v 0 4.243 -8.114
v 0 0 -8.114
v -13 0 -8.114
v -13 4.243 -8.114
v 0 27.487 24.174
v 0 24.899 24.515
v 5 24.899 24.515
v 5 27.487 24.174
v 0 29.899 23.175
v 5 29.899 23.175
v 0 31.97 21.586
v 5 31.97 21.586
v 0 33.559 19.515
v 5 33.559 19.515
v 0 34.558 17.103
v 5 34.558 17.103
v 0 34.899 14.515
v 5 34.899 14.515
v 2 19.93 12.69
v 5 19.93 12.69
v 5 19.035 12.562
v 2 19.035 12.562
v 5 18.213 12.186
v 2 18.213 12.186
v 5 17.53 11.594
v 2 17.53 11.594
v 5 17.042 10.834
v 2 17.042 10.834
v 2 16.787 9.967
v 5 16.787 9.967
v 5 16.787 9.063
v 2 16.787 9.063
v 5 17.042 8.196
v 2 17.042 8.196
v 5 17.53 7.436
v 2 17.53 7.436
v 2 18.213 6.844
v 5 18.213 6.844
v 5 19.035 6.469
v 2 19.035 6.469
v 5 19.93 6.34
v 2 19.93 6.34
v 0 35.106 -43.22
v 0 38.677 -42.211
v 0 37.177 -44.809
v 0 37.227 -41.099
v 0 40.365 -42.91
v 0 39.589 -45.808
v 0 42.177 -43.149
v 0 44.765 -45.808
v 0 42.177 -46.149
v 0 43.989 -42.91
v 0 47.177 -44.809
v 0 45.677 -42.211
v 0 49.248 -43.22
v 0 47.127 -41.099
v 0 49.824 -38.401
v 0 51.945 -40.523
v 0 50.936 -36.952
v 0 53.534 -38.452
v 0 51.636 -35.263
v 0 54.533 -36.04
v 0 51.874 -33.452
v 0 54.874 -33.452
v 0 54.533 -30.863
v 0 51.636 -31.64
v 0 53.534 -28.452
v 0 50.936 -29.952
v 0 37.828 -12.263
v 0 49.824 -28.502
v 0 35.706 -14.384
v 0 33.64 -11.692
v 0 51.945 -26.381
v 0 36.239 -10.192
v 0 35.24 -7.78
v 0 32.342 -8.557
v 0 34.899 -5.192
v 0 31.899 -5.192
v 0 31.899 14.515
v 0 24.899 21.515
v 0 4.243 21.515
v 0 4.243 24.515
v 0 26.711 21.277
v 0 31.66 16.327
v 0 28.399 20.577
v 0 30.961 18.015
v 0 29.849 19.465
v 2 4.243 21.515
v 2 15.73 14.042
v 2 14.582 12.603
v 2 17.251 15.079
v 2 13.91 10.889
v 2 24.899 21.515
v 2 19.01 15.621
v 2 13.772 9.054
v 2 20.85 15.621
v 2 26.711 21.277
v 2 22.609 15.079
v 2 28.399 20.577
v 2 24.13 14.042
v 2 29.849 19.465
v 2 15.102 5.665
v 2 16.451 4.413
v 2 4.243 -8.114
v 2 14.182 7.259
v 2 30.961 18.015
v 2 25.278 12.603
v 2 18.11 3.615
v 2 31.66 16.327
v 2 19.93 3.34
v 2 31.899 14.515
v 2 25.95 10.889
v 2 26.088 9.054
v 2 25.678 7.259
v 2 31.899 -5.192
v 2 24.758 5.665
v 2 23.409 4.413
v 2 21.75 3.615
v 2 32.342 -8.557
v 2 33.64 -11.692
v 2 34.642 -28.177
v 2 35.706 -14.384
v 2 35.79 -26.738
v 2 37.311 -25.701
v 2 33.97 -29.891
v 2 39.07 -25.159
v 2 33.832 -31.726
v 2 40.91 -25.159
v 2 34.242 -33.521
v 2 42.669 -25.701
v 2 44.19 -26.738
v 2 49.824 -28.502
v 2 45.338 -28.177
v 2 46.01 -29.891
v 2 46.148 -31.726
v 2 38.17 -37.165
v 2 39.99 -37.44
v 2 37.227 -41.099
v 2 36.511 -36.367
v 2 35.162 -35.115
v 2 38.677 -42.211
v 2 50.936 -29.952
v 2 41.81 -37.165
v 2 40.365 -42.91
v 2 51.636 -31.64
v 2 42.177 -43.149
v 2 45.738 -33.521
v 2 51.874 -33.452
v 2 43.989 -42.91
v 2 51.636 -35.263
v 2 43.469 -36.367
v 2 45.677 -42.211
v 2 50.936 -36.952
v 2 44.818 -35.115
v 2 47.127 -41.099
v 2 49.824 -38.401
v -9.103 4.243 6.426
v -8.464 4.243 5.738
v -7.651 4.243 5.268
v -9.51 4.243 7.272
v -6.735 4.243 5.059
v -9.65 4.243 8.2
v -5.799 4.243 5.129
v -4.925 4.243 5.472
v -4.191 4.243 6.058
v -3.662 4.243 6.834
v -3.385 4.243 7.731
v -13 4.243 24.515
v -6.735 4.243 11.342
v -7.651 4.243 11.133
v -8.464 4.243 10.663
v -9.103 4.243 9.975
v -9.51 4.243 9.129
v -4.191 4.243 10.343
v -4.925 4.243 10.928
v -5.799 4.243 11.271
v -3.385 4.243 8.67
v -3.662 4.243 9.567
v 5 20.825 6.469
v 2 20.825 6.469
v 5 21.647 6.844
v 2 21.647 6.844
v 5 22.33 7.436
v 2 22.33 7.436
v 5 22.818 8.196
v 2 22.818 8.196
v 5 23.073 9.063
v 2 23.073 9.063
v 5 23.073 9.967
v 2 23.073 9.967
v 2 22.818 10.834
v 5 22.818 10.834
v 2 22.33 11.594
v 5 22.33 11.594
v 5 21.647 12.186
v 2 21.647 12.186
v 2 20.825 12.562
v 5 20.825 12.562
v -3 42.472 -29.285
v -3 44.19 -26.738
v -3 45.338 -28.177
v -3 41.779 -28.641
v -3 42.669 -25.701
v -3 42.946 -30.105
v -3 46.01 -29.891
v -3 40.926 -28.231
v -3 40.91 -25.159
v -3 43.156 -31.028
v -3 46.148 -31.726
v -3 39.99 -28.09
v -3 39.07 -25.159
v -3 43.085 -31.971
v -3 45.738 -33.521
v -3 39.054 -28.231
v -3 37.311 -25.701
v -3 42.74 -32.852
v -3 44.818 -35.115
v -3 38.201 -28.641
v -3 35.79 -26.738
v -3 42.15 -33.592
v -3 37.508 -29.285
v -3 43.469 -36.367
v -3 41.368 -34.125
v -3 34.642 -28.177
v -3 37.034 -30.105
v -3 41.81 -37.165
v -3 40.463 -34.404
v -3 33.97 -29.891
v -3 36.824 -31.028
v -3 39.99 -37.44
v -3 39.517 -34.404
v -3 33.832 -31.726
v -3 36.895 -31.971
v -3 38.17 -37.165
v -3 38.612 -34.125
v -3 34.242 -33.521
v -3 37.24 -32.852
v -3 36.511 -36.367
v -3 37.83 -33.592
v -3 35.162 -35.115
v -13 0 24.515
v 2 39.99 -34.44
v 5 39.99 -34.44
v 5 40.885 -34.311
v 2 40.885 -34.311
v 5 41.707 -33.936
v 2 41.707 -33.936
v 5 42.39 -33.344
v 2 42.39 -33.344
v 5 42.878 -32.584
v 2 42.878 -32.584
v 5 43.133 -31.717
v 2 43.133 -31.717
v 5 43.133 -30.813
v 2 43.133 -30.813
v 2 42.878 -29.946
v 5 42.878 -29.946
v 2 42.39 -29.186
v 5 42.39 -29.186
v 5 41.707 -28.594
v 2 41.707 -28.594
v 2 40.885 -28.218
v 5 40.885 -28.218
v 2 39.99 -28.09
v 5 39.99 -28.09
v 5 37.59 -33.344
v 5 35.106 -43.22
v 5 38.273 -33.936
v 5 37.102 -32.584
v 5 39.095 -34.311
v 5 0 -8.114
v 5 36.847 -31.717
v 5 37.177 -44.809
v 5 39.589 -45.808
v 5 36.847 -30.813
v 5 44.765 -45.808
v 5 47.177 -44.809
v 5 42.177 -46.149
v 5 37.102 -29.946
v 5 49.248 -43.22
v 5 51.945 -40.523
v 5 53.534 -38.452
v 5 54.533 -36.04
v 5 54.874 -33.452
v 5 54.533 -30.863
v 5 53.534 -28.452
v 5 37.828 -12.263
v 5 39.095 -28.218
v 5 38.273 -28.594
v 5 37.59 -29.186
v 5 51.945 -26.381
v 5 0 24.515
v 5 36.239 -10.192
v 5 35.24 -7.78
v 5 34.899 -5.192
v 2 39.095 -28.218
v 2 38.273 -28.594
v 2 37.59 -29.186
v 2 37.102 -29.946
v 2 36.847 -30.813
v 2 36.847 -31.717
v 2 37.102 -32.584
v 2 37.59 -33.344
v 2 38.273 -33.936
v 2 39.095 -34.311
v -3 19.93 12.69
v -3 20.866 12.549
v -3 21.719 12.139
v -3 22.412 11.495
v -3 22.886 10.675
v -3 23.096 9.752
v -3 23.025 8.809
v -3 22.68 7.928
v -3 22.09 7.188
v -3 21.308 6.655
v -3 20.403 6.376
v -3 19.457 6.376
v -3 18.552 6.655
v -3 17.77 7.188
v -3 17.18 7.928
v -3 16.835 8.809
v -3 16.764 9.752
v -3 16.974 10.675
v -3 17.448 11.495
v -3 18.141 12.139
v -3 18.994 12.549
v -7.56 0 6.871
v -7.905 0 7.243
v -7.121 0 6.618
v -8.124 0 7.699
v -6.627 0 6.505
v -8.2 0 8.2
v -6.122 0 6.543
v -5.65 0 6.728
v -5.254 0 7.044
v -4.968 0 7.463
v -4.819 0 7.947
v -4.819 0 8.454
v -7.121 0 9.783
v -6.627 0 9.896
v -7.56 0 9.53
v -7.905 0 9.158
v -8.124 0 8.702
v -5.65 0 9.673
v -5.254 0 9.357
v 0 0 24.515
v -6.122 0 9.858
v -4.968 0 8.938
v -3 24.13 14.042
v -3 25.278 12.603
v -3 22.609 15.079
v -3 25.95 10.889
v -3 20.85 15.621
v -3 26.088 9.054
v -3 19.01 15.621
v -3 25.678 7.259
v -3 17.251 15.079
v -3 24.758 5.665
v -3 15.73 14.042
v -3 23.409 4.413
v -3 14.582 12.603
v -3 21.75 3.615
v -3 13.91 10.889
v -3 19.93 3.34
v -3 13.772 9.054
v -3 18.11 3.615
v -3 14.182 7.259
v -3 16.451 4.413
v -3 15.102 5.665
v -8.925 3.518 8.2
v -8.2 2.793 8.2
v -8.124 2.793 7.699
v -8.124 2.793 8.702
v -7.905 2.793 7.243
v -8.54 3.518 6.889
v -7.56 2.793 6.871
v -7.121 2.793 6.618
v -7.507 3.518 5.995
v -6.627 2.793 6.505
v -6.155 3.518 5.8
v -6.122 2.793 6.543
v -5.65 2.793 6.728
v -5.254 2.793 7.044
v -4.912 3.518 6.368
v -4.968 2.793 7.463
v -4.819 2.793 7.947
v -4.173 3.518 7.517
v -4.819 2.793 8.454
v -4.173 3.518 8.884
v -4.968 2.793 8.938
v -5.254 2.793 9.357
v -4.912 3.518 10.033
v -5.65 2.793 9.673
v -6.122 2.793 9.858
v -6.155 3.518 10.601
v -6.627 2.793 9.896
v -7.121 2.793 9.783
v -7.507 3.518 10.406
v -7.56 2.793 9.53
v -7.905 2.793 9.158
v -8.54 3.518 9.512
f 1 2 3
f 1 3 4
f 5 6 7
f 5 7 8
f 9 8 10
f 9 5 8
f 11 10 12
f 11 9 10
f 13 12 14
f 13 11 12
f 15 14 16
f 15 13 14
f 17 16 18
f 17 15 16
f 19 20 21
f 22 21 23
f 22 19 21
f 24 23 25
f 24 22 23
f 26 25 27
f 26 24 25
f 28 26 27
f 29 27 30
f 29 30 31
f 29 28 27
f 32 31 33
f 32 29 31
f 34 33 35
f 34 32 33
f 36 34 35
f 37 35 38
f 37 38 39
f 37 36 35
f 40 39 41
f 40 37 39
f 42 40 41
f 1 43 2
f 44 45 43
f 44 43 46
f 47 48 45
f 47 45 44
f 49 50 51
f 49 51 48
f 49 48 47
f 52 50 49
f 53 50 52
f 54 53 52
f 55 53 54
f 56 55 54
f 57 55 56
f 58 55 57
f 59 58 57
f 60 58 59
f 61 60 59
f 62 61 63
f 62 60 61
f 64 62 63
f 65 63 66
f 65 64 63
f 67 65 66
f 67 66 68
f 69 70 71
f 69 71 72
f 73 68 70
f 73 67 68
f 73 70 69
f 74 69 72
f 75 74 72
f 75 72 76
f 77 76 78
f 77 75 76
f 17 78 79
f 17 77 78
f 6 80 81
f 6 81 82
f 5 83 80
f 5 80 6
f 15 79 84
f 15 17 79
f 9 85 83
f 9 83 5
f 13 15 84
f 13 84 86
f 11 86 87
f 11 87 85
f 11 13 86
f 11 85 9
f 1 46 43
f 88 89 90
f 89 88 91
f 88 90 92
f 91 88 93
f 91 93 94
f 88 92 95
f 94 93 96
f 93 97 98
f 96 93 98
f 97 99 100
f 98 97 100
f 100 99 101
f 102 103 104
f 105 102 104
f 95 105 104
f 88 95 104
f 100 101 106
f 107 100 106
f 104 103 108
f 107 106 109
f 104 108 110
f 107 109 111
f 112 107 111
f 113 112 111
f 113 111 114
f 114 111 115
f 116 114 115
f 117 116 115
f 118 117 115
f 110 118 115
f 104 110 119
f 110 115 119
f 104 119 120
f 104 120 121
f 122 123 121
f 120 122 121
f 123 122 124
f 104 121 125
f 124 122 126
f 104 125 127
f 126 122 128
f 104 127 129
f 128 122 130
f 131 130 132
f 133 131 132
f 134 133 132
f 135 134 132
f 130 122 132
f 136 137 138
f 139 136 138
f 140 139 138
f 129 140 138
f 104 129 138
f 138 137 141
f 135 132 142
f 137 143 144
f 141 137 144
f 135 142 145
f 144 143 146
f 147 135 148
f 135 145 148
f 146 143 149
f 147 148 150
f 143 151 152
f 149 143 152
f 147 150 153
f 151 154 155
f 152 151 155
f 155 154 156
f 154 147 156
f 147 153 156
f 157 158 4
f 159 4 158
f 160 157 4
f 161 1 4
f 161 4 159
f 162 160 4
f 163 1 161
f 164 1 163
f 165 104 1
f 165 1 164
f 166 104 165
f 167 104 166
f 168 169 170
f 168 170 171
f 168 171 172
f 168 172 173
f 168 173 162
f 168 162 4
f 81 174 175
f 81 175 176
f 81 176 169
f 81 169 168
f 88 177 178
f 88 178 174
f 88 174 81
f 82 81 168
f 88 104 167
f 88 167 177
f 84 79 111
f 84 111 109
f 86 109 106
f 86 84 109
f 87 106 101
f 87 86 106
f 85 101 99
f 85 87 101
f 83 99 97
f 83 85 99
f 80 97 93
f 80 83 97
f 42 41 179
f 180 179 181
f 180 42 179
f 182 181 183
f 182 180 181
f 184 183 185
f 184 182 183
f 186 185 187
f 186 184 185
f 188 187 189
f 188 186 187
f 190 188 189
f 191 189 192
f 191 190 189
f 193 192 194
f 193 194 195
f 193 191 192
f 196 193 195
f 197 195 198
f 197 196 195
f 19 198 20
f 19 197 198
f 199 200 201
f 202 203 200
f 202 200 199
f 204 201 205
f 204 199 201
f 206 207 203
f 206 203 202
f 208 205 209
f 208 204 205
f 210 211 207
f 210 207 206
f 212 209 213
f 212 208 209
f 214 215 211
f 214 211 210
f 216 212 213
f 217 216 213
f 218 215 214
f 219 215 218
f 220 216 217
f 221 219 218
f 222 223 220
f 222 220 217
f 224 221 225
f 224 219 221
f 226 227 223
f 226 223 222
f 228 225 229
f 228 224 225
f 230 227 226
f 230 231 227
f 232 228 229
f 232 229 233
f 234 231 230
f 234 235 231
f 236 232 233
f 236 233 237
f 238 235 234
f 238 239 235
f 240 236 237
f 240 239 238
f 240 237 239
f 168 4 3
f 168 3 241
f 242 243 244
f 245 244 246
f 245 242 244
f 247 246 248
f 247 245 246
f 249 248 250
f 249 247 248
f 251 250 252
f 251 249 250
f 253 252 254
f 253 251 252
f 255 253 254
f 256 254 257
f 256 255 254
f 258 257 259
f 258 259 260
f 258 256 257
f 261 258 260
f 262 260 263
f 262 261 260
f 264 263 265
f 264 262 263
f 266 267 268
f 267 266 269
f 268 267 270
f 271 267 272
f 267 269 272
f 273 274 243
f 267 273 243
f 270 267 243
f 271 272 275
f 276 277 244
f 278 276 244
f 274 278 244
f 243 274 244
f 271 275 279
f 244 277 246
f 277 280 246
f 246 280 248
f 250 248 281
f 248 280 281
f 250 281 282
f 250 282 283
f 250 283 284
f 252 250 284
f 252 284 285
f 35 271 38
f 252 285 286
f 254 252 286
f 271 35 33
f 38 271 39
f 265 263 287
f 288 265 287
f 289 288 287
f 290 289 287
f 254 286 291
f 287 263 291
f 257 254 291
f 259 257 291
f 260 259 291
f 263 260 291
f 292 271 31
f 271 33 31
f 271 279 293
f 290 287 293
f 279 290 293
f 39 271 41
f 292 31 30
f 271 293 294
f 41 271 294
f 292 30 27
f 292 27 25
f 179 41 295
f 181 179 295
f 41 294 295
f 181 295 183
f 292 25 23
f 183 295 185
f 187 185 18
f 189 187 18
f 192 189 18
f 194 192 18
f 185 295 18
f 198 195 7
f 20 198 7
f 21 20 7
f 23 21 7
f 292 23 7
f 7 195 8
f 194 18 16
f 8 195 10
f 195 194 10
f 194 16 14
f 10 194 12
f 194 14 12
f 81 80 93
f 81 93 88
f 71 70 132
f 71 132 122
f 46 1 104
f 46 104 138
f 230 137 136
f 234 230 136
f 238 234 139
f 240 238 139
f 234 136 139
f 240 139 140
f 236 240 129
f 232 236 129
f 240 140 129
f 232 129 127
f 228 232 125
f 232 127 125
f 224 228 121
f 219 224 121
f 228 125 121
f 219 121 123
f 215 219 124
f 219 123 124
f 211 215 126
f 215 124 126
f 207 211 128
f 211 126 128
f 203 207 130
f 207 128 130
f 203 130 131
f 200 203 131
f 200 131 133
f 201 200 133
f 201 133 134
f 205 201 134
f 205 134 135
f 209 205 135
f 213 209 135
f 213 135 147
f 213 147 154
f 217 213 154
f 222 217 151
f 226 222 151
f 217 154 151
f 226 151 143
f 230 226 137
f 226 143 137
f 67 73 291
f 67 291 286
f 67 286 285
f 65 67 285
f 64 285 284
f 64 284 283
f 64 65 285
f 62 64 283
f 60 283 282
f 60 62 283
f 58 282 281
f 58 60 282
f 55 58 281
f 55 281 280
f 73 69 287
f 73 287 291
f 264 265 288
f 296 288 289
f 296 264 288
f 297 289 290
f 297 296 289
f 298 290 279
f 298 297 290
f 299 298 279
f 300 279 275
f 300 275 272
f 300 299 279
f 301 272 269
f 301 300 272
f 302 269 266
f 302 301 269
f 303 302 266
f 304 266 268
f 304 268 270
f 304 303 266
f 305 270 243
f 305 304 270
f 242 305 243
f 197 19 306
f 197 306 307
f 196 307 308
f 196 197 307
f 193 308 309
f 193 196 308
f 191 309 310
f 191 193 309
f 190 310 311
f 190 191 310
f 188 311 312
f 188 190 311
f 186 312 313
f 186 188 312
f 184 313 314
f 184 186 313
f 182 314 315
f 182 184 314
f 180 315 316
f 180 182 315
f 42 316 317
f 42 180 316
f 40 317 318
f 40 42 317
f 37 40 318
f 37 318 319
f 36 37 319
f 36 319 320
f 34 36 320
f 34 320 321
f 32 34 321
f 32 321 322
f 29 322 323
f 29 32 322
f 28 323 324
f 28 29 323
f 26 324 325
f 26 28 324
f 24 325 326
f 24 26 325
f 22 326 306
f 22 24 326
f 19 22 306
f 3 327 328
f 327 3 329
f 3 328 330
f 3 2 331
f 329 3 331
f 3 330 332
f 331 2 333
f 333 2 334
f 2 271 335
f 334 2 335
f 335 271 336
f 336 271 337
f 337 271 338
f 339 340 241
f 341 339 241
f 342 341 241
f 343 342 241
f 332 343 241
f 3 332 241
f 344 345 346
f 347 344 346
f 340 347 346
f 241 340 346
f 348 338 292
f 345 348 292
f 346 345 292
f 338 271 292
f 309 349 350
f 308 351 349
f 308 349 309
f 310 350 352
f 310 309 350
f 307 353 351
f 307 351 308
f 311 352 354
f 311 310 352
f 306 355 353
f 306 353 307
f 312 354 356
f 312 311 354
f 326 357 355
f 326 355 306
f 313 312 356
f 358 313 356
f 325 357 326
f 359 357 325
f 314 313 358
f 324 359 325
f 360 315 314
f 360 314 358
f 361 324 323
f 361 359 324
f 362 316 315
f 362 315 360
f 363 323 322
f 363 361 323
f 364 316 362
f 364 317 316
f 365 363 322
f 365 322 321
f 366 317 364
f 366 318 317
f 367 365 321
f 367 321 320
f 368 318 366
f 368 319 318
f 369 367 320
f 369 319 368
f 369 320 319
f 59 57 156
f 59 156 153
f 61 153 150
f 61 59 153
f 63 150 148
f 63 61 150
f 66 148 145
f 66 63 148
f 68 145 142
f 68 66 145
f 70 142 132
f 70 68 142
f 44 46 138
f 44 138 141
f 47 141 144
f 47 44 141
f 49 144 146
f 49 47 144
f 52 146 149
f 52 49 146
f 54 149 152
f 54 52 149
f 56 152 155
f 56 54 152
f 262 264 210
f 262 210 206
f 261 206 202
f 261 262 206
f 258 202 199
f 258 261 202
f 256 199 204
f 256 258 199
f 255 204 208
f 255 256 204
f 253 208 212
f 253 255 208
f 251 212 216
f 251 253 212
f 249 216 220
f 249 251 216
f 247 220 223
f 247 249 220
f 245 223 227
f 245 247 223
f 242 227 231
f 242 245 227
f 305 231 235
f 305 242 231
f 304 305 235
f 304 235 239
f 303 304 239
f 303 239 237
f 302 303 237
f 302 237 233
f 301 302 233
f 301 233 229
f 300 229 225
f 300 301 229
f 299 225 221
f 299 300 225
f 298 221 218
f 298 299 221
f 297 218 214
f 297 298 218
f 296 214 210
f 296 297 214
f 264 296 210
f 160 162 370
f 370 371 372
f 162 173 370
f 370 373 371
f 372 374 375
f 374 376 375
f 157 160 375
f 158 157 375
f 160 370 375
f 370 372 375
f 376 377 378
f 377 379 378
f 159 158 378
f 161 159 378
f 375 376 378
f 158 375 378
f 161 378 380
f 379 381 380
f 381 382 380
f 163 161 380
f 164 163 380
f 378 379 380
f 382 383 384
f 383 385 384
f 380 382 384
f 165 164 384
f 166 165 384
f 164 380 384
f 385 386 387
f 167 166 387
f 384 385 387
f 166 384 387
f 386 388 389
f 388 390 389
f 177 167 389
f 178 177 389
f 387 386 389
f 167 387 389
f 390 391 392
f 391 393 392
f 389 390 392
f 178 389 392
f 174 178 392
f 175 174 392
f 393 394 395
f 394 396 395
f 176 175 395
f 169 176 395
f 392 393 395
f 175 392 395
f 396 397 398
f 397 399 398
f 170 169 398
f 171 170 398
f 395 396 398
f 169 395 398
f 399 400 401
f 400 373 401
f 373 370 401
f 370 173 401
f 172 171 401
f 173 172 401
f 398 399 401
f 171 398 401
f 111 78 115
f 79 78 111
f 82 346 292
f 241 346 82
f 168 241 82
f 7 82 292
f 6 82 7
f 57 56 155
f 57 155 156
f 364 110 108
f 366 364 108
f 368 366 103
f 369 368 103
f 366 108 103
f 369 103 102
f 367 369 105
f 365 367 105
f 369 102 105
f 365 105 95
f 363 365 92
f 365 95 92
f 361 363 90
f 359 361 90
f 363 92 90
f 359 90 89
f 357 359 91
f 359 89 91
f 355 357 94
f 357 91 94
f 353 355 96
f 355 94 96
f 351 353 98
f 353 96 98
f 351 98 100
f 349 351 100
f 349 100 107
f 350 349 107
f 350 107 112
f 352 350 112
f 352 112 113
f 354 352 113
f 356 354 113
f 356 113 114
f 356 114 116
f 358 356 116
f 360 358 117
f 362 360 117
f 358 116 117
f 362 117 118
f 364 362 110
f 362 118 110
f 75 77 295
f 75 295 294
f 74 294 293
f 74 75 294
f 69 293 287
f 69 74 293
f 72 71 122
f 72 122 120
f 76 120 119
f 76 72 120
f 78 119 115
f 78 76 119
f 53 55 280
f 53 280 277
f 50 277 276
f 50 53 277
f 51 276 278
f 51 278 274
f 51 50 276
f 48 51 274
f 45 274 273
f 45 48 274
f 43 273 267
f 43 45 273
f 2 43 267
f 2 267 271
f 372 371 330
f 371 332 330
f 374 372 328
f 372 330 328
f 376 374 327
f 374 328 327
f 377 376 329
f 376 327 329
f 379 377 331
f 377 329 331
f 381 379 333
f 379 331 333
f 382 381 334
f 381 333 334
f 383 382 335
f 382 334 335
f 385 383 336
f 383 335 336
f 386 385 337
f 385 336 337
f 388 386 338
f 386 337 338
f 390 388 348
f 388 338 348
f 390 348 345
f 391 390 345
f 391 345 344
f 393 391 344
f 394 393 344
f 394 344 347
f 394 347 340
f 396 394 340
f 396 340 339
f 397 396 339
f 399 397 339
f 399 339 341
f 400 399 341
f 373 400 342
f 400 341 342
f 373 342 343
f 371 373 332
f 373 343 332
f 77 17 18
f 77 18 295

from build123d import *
from build123d.topology import SkipClean

# Parameters (mm, degrees)
SKETCH1_R                                       = 3.175
EXTRUDE_BODY_DEPTH                              = 5
INSET_BODY_DEPTH                                = 2
SKETCH3_R                                       = 6.175
CUT_HOLE_BOSS_DEPTH                             = 5
CUT_EXTRUDE2_DEPTH                              = 72.874270106
CUT_EXTRUDE2_DEPTH_BACK                         = 5
REAM_HOLE_R                                     = 3.175
SKETCH4_W                                       = 32.629490944
SKETCH4_H                                       = 4.242640687
BOSS_EXTRUDE1_DEPTH                             = 15
CSK_FOR_M3_FLAT_HEAD_MACHINE_SCREW1_D           = 3.4
CSK_FOR_M3_FLAT_HEAD_MACHINE_SCREW1_CSINK_D     = 6.3
CSK_FOR_M3_FLAT_HEAD_MACHINE_SCREW1_CSINK_ANGLE = 90


with BuildPart() as part:
    # Sketch1 → Extrude body (new body)
    with BuildSketch(Plane(origin=(0, 0, 0), x_dir=(0, 0, -1), z_dir=(1, 0, 0))):
        with BuildLine():
            Line((8.114294626, 0), (-24.515196318, 0))
            Line((-24.515196318, 0), (-24.515196318, 24.898772612))
            ThreePointArc((-24.515196318, 24.898772612), (-21.586264129, 31.969840424), (-14.515196318, 34.898772612))
            Line((-14.515196318, 34.898772612), (5.191949728, 34.898772612))
            ThreePointArc((5.191949728, 34.898772612), (9.018784051, 35.659977287), (12.26301754, 37.8277048))
            Line((12.26301754, 37.8277048), (26.380592117, 51.945279378))
            ThreePointArc((26.380592117, 51.945279378), (33.451659929, 54.874211566), (40.52272774, 51.945279378))
            Line((40.52272774, 51.945279378), (43.22008306, 49.247924058))
            ThreePointArc((43.22008306, 49.247924058), (46.149015248, 42.176856246), (43.22008306, 35.105788434))
            Line((43.22008306, 35.105788434), (8.114294626, 0))
        make_face()
        with Locations((31.264803682, 39.99)):
            Circle(SKETCH1_R, mode=Mode.SUBTRACT)
        with Locations((-9.515196318, 19.93)):
            Circle(SKETCH1_R, mode=Mode.SUBTRACT)
    extrude(amount=EXTRUDE_BODY_DEPTH)

    # Sketch2 → Inset body (cut)
    with BuildSketch(Plane(origin=(0, 0, 0), x_dir=(0, 0, -1), z_dir=(1, 0, 0))):
        with BuildLine():
            Line((-21.515196318, 24.898772612), (-21.515196318, 3))
            Line((-21.515196318, 3), (6.871653938, 3))
            Line((6.871653938, 3), (41.098762716, 37.227108778))
            ThreePointArc((41.098762716, 37.227108778), (43.149015248, 42.176856246), (41.098762716, 47.126603714))
            Line((41.098762716, 47.126603714), (38.401407397, 49.823959034))
            ThreePointArc((38.401407397, 49.823959034), (33.451659929, 51.874211566), (28.50191246, 49.823959034))
            Line((28.50191246, 49.823959034), (14.384337883, 35.706384457))
            ThreePointArc((14.384337883, 35.706384457), (10.166834349, 32.88833869), (5.191949728, 31.898772612))
            Line((5.191949728, 31.898772612), (-14.515196318, 31.898772612))
            ThreePointArc((-14.515196318, 31.898772612), (-19.464943786, 29.848520081), (-21.515196318, 24.898772612))
        make_face()
    extrude(amount=INSET_BODY_DEPTH, mode=Mode.SUBTRACT)

    # Sketch3 → Cut hole boss (add)
    with BuildSketch(Plane.ZY.offset(-2)):
        with Locations((9.515196318, 19.93)):
            Circle(SKETCH3_R)
        with Locations((-31.264803682, 39.99)):
            Circle(SKETCH3_R)
    extrude(amount=CUT_HOLE_BOSS_DEPTH)

    # Ream hole → Cut-Extrude2 (cut, two sides: drawn at the far end of the back side and taken through both)
    with SkipClean():  # the faces are left unmerged after this step: merging them gives an invalid solid
        with BuildSketch(Plane.ZY.offset(-CUT_EXTRUDE2_DEPTH_BACK)):
            with Locations((-31.264803682, 39.99)):
                Circle(REAM_HOLE_R)
            with Locations((9.515196318, 19.93)):
                Circle(REAM_HOLE_R)
        extrude(amount=CUT_EXTRUDE2_DEPTH + CUT_EXTRUDE2_DEPTH_BACK, mode=Mode.SUBTRACT)

    # Sketch4 → Boss-Extrude1 (add)
    with SkipClean():  # the faces are left unmerged after this step: merging them gives an invalid solid
        with BuildSketch(Plane.ZY.offset(-2)):
            with Locations((8.200450846, 2.121320344)):
                Rectangle(SKETCH4_W, SKETCH4_H)
        extrude(amount=BOSS_EXTRUDE1_DEPTH)

    # CSK for M3 Flat Head Machine Screw1 (through all)
    with Locations(Plane(origin=(0, 4.242640687, 0), x_dir=(1, 0, 0), z_dir=(0, 1, 0))):
        with Locations((-6.5, -8.200450846)):
            CounterSinkHole(CSK_FOR_M3_FLAT_HEAD_MACHINE_SCREW1_D / 2, CSK_FOR_M3_FLAT_HEAD_MACHINE_SCREW1_CSINK_D / 2, counter_sink_angle=CSK_FOR_M3_FLAT_HEAD_MACHINE_SCREW1_CSINK_ANGLE)


solid = part.part
